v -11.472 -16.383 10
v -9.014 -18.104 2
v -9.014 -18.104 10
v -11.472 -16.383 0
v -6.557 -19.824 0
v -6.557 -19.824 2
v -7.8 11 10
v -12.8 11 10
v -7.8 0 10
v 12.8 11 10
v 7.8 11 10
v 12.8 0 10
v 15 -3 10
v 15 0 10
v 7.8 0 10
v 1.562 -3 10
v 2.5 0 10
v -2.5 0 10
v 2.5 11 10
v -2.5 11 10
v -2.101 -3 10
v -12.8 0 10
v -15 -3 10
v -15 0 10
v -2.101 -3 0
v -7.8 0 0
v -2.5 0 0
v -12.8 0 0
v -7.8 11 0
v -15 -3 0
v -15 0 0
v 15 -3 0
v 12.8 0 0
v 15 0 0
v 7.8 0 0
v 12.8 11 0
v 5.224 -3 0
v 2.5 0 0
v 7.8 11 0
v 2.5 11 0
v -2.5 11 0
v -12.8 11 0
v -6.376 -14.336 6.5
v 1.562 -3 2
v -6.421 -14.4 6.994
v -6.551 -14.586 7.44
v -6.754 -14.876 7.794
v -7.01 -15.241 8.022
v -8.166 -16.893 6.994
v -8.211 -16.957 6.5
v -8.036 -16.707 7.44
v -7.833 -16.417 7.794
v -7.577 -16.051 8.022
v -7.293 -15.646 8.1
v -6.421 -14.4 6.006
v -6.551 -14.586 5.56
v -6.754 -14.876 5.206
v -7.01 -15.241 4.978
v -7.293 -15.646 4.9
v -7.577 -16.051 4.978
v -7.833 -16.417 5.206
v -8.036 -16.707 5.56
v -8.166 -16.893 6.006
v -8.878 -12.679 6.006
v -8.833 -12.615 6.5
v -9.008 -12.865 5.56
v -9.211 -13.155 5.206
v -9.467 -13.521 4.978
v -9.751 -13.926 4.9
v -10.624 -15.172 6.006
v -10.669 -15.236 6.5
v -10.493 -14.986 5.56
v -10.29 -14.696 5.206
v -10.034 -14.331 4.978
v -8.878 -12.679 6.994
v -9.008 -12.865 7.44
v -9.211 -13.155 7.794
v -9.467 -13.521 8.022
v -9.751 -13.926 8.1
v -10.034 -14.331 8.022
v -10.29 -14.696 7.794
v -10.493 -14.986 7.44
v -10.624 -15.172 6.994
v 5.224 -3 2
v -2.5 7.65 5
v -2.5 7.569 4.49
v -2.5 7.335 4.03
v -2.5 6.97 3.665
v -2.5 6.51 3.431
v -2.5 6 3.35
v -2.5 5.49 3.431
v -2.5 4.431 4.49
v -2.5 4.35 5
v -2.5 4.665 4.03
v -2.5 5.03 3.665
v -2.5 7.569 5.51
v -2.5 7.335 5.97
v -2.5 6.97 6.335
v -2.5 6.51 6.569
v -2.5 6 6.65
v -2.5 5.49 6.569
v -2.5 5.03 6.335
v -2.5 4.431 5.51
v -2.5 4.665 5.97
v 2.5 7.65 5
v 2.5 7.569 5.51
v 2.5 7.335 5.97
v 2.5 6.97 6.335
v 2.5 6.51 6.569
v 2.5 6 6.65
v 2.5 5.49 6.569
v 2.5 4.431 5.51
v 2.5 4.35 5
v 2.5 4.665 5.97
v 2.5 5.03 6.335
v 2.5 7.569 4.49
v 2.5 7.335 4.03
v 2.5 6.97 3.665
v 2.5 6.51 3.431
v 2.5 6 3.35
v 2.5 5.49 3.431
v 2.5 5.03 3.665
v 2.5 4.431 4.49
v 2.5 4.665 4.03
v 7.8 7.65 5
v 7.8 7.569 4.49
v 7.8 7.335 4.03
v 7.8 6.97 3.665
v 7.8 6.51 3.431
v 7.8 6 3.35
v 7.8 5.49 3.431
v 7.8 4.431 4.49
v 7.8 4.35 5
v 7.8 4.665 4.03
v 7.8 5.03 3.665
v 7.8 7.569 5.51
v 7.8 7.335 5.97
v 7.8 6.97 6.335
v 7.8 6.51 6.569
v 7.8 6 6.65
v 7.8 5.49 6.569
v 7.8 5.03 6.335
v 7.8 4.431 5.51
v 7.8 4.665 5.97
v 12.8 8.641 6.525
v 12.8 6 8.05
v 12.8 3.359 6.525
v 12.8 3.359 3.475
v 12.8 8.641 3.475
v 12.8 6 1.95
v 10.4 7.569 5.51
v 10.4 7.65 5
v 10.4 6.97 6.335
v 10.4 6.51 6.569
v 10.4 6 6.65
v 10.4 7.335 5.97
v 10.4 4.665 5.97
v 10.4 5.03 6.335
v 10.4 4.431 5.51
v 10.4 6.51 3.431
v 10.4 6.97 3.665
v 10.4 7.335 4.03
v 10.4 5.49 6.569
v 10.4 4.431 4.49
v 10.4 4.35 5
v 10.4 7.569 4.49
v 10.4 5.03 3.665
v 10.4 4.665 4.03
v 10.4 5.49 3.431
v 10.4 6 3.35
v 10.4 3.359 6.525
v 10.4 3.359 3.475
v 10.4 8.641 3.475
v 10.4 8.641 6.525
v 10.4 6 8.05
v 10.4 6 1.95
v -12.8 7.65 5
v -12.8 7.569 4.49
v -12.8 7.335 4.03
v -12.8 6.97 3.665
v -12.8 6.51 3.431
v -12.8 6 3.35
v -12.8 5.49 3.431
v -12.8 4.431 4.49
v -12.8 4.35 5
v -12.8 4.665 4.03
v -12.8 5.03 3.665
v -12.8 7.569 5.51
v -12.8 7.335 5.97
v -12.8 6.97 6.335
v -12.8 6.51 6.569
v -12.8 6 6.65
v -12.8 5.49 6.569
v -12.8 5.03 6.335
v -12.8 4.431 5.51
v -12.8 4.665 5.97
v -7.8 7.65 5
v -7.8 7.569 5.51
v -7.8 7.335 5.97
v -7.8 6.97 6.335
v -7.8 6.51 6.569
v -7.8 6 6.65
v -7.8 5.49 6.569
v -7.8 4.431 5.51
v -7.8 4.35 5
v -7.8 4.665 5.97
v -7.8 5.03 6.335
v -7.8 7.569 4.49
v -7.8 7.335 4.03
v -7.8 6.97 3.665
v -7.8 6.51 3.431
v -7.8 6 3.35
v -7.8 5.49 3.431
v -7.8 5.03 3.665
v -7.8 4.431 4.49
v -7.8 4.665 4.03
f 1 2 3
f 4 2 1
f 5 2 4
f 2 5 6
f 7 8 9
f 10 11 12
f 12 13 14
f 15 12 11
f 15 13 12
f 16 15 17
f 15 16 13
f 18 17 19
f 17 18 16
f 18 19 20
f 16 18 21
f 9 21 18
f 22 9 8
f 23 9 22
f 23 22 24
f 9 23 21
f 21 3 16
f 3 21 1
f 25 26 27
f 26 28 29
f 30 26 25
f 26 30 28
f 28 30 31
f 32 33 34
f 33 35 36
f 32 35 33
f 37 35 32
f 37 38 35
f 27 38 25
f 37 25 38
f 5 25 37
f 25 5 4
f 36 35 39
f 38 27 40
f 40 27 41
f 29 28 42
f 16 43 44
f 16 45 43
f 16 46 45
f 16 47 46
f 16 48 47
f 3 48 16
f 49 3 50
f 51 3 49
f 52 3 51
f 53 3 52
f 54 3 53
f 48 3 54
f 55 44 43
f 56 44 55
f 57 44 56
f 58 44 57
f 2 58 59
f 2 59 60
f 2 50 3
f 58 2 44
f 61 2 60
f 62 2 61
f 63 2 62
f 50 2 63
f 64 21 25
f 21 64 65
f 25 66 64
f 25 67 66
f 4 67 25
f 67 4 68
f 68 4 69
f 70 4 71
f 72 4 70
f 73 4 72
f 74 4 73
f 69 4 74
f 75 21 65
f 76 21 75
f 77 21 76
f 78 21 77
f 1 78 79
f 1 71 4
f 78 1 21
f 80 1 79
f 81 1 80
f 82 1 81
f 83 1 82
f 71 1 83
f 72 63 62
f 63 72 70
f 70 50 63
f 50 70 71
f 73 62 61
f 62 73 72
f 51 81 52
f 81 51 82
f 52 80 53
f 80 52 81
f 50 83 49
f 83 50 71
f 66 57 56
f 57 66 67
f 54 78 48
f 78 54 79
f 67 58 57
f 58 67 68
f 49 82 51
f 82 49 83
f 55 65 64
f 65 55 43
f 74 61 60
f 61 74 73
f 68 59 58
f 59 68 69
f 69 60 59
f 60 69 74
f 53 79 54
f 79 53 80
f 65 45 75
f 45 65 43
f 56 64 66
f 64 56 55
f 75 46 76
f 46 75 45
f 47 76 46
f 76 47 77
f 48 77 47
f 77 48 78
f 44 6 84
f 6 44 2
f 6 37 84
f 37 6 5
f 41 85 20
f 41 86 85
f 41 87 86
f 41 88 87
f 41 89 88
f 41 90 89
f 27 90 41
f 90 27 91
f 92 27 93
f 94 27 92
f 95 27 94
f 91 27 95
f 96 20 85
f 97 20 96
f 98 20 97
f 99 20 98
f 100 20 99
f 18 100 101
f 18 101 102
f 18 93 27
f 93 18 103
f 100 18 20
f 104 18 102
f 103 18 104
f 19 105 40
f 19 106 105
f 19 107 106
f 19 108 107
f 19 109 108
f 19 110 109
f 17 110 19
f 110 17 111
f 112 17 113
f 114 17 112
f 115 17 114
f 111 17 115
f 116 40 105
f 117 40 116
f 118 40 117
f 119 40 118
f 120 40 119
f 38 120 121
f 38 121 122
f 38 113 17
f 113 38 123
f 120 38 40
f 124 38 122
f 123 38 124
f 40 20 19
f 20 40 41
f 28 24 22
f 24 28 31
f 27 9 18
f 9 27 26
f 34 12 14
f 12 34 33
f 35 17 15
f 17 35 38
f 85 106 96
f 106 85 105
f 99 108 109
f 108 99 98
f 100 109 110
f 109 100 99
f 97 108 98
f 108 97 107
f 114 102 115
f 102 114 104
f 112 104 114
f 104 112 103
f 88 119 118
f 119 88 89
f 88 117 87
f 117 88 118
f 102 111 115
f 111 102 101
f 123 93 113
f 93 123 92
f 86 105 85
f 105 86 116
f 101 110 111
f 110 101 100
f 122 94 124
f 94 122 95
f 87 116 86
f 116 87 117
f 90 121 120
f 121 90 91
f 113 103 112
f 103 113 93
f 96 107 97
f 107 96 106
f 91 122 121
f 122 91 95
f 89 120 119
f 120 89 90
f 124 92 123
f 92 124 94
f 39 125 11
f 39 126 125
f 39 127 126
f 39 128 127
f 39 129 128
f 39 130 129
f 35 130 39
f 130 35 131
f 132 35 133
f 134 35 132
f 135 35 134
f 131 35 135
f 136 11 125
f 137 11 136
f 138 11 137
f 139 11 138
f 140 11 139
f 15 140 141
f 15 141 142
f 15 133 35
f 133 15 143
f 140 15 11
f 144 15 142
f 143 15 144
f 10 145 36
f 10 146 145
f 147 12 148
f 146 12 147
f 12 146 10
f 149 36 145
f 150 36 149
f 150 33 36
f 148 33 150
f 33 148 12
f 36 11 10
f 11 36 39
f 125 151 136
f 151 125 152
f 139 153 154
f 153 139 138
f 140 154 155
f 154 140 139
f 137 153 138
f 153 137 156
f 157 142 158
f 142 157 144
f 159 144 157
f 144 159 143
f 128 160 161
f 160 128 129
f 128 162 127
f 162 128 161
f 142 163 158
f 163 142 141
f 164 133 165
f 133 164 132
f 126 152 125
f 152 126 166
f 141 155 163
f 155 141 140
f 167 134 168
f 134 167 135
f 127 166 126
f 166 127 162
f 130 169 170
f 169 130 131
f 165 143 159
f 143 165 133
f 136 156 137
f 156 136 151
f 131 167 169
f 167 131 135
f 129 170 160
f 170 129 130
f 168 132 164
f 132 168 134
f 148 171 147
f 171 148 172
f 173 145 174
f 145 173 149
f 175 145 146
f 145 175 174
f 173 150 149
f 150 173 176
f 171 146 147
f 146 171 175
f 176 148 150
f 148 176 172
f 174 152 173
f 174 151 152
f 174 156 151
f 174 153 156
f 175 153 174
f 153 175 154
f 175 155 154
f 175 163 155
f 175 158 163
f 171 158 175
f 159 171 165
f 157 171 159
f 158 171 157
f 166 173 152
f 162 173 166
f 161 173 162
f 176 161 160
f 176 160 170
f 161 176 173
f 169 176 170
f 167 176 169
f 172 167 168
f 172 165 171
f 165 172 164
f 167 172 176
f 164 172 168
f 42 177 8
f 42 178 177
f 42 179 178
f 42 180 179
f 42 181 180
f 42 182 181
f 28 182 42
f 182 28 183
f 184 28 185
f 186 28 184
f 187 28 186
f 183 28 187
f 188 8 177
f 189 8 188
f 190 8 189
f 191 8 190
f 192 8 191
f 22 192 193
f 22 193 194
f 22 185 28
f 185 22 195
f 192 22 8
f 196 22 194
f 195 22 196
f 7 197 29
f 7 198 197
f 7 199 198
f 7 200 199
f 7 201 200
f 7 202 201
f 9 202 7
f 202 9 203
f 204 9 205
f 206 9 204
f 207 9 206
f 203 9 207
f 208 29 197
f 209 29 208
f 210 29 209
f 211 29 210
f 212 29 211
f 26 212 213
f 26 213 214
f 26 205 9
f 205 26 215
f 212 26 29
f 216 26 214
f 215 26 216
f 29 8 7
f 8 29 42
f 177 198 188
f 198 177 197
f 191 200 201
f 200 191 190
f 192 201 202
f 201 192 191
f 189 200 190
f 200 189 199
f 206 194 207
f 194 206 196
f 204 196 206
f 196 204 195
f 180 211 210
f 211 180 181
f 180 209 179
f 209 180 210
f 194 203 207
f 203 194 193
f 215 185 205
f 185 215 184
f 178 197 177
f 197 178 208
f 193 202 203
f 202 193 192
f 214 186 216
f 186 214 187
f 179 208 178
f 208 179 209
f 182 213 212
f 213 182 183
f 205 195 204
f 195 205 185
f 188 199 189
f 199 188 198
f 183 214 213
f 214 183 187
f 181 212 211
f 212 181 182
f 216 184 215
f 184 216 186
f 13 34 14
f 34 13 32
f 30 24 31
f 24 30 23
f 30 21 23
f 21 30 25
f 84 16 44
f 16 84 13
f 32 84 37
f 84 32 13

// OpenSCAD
module fan_pad(nut = false){
rotate([0,-90,0])
difference(){
if(nut){
cube([10,11,5]);
}else{
cube([10,11,5]);
}
translate([5,6])cylinder(r=3.3/2,h=6,$fn=20);
if (nut)
#translate([5,6,-0.1])cylinder(r=6.1/2,h=2.5,$fn=6);

}

}
module holder(){
translate([-1,0,0])cube([21,6,2]);
difference(){
cube([20,3,10]);

translate([20-3,-1,6.5])rotate([-90,0,0])cylinder(r=3.2/2,h=10,$fn=20);
}

}


rotate([0,0,-90-35])holder();
translate([-15,-3,0])cube([30,3,10]);
translate([2.5,0])fan_pad();
translate([2.5+5.3+5,0])fan_pad(true);
translate([-2.5-5.3,0])fan_pad();
